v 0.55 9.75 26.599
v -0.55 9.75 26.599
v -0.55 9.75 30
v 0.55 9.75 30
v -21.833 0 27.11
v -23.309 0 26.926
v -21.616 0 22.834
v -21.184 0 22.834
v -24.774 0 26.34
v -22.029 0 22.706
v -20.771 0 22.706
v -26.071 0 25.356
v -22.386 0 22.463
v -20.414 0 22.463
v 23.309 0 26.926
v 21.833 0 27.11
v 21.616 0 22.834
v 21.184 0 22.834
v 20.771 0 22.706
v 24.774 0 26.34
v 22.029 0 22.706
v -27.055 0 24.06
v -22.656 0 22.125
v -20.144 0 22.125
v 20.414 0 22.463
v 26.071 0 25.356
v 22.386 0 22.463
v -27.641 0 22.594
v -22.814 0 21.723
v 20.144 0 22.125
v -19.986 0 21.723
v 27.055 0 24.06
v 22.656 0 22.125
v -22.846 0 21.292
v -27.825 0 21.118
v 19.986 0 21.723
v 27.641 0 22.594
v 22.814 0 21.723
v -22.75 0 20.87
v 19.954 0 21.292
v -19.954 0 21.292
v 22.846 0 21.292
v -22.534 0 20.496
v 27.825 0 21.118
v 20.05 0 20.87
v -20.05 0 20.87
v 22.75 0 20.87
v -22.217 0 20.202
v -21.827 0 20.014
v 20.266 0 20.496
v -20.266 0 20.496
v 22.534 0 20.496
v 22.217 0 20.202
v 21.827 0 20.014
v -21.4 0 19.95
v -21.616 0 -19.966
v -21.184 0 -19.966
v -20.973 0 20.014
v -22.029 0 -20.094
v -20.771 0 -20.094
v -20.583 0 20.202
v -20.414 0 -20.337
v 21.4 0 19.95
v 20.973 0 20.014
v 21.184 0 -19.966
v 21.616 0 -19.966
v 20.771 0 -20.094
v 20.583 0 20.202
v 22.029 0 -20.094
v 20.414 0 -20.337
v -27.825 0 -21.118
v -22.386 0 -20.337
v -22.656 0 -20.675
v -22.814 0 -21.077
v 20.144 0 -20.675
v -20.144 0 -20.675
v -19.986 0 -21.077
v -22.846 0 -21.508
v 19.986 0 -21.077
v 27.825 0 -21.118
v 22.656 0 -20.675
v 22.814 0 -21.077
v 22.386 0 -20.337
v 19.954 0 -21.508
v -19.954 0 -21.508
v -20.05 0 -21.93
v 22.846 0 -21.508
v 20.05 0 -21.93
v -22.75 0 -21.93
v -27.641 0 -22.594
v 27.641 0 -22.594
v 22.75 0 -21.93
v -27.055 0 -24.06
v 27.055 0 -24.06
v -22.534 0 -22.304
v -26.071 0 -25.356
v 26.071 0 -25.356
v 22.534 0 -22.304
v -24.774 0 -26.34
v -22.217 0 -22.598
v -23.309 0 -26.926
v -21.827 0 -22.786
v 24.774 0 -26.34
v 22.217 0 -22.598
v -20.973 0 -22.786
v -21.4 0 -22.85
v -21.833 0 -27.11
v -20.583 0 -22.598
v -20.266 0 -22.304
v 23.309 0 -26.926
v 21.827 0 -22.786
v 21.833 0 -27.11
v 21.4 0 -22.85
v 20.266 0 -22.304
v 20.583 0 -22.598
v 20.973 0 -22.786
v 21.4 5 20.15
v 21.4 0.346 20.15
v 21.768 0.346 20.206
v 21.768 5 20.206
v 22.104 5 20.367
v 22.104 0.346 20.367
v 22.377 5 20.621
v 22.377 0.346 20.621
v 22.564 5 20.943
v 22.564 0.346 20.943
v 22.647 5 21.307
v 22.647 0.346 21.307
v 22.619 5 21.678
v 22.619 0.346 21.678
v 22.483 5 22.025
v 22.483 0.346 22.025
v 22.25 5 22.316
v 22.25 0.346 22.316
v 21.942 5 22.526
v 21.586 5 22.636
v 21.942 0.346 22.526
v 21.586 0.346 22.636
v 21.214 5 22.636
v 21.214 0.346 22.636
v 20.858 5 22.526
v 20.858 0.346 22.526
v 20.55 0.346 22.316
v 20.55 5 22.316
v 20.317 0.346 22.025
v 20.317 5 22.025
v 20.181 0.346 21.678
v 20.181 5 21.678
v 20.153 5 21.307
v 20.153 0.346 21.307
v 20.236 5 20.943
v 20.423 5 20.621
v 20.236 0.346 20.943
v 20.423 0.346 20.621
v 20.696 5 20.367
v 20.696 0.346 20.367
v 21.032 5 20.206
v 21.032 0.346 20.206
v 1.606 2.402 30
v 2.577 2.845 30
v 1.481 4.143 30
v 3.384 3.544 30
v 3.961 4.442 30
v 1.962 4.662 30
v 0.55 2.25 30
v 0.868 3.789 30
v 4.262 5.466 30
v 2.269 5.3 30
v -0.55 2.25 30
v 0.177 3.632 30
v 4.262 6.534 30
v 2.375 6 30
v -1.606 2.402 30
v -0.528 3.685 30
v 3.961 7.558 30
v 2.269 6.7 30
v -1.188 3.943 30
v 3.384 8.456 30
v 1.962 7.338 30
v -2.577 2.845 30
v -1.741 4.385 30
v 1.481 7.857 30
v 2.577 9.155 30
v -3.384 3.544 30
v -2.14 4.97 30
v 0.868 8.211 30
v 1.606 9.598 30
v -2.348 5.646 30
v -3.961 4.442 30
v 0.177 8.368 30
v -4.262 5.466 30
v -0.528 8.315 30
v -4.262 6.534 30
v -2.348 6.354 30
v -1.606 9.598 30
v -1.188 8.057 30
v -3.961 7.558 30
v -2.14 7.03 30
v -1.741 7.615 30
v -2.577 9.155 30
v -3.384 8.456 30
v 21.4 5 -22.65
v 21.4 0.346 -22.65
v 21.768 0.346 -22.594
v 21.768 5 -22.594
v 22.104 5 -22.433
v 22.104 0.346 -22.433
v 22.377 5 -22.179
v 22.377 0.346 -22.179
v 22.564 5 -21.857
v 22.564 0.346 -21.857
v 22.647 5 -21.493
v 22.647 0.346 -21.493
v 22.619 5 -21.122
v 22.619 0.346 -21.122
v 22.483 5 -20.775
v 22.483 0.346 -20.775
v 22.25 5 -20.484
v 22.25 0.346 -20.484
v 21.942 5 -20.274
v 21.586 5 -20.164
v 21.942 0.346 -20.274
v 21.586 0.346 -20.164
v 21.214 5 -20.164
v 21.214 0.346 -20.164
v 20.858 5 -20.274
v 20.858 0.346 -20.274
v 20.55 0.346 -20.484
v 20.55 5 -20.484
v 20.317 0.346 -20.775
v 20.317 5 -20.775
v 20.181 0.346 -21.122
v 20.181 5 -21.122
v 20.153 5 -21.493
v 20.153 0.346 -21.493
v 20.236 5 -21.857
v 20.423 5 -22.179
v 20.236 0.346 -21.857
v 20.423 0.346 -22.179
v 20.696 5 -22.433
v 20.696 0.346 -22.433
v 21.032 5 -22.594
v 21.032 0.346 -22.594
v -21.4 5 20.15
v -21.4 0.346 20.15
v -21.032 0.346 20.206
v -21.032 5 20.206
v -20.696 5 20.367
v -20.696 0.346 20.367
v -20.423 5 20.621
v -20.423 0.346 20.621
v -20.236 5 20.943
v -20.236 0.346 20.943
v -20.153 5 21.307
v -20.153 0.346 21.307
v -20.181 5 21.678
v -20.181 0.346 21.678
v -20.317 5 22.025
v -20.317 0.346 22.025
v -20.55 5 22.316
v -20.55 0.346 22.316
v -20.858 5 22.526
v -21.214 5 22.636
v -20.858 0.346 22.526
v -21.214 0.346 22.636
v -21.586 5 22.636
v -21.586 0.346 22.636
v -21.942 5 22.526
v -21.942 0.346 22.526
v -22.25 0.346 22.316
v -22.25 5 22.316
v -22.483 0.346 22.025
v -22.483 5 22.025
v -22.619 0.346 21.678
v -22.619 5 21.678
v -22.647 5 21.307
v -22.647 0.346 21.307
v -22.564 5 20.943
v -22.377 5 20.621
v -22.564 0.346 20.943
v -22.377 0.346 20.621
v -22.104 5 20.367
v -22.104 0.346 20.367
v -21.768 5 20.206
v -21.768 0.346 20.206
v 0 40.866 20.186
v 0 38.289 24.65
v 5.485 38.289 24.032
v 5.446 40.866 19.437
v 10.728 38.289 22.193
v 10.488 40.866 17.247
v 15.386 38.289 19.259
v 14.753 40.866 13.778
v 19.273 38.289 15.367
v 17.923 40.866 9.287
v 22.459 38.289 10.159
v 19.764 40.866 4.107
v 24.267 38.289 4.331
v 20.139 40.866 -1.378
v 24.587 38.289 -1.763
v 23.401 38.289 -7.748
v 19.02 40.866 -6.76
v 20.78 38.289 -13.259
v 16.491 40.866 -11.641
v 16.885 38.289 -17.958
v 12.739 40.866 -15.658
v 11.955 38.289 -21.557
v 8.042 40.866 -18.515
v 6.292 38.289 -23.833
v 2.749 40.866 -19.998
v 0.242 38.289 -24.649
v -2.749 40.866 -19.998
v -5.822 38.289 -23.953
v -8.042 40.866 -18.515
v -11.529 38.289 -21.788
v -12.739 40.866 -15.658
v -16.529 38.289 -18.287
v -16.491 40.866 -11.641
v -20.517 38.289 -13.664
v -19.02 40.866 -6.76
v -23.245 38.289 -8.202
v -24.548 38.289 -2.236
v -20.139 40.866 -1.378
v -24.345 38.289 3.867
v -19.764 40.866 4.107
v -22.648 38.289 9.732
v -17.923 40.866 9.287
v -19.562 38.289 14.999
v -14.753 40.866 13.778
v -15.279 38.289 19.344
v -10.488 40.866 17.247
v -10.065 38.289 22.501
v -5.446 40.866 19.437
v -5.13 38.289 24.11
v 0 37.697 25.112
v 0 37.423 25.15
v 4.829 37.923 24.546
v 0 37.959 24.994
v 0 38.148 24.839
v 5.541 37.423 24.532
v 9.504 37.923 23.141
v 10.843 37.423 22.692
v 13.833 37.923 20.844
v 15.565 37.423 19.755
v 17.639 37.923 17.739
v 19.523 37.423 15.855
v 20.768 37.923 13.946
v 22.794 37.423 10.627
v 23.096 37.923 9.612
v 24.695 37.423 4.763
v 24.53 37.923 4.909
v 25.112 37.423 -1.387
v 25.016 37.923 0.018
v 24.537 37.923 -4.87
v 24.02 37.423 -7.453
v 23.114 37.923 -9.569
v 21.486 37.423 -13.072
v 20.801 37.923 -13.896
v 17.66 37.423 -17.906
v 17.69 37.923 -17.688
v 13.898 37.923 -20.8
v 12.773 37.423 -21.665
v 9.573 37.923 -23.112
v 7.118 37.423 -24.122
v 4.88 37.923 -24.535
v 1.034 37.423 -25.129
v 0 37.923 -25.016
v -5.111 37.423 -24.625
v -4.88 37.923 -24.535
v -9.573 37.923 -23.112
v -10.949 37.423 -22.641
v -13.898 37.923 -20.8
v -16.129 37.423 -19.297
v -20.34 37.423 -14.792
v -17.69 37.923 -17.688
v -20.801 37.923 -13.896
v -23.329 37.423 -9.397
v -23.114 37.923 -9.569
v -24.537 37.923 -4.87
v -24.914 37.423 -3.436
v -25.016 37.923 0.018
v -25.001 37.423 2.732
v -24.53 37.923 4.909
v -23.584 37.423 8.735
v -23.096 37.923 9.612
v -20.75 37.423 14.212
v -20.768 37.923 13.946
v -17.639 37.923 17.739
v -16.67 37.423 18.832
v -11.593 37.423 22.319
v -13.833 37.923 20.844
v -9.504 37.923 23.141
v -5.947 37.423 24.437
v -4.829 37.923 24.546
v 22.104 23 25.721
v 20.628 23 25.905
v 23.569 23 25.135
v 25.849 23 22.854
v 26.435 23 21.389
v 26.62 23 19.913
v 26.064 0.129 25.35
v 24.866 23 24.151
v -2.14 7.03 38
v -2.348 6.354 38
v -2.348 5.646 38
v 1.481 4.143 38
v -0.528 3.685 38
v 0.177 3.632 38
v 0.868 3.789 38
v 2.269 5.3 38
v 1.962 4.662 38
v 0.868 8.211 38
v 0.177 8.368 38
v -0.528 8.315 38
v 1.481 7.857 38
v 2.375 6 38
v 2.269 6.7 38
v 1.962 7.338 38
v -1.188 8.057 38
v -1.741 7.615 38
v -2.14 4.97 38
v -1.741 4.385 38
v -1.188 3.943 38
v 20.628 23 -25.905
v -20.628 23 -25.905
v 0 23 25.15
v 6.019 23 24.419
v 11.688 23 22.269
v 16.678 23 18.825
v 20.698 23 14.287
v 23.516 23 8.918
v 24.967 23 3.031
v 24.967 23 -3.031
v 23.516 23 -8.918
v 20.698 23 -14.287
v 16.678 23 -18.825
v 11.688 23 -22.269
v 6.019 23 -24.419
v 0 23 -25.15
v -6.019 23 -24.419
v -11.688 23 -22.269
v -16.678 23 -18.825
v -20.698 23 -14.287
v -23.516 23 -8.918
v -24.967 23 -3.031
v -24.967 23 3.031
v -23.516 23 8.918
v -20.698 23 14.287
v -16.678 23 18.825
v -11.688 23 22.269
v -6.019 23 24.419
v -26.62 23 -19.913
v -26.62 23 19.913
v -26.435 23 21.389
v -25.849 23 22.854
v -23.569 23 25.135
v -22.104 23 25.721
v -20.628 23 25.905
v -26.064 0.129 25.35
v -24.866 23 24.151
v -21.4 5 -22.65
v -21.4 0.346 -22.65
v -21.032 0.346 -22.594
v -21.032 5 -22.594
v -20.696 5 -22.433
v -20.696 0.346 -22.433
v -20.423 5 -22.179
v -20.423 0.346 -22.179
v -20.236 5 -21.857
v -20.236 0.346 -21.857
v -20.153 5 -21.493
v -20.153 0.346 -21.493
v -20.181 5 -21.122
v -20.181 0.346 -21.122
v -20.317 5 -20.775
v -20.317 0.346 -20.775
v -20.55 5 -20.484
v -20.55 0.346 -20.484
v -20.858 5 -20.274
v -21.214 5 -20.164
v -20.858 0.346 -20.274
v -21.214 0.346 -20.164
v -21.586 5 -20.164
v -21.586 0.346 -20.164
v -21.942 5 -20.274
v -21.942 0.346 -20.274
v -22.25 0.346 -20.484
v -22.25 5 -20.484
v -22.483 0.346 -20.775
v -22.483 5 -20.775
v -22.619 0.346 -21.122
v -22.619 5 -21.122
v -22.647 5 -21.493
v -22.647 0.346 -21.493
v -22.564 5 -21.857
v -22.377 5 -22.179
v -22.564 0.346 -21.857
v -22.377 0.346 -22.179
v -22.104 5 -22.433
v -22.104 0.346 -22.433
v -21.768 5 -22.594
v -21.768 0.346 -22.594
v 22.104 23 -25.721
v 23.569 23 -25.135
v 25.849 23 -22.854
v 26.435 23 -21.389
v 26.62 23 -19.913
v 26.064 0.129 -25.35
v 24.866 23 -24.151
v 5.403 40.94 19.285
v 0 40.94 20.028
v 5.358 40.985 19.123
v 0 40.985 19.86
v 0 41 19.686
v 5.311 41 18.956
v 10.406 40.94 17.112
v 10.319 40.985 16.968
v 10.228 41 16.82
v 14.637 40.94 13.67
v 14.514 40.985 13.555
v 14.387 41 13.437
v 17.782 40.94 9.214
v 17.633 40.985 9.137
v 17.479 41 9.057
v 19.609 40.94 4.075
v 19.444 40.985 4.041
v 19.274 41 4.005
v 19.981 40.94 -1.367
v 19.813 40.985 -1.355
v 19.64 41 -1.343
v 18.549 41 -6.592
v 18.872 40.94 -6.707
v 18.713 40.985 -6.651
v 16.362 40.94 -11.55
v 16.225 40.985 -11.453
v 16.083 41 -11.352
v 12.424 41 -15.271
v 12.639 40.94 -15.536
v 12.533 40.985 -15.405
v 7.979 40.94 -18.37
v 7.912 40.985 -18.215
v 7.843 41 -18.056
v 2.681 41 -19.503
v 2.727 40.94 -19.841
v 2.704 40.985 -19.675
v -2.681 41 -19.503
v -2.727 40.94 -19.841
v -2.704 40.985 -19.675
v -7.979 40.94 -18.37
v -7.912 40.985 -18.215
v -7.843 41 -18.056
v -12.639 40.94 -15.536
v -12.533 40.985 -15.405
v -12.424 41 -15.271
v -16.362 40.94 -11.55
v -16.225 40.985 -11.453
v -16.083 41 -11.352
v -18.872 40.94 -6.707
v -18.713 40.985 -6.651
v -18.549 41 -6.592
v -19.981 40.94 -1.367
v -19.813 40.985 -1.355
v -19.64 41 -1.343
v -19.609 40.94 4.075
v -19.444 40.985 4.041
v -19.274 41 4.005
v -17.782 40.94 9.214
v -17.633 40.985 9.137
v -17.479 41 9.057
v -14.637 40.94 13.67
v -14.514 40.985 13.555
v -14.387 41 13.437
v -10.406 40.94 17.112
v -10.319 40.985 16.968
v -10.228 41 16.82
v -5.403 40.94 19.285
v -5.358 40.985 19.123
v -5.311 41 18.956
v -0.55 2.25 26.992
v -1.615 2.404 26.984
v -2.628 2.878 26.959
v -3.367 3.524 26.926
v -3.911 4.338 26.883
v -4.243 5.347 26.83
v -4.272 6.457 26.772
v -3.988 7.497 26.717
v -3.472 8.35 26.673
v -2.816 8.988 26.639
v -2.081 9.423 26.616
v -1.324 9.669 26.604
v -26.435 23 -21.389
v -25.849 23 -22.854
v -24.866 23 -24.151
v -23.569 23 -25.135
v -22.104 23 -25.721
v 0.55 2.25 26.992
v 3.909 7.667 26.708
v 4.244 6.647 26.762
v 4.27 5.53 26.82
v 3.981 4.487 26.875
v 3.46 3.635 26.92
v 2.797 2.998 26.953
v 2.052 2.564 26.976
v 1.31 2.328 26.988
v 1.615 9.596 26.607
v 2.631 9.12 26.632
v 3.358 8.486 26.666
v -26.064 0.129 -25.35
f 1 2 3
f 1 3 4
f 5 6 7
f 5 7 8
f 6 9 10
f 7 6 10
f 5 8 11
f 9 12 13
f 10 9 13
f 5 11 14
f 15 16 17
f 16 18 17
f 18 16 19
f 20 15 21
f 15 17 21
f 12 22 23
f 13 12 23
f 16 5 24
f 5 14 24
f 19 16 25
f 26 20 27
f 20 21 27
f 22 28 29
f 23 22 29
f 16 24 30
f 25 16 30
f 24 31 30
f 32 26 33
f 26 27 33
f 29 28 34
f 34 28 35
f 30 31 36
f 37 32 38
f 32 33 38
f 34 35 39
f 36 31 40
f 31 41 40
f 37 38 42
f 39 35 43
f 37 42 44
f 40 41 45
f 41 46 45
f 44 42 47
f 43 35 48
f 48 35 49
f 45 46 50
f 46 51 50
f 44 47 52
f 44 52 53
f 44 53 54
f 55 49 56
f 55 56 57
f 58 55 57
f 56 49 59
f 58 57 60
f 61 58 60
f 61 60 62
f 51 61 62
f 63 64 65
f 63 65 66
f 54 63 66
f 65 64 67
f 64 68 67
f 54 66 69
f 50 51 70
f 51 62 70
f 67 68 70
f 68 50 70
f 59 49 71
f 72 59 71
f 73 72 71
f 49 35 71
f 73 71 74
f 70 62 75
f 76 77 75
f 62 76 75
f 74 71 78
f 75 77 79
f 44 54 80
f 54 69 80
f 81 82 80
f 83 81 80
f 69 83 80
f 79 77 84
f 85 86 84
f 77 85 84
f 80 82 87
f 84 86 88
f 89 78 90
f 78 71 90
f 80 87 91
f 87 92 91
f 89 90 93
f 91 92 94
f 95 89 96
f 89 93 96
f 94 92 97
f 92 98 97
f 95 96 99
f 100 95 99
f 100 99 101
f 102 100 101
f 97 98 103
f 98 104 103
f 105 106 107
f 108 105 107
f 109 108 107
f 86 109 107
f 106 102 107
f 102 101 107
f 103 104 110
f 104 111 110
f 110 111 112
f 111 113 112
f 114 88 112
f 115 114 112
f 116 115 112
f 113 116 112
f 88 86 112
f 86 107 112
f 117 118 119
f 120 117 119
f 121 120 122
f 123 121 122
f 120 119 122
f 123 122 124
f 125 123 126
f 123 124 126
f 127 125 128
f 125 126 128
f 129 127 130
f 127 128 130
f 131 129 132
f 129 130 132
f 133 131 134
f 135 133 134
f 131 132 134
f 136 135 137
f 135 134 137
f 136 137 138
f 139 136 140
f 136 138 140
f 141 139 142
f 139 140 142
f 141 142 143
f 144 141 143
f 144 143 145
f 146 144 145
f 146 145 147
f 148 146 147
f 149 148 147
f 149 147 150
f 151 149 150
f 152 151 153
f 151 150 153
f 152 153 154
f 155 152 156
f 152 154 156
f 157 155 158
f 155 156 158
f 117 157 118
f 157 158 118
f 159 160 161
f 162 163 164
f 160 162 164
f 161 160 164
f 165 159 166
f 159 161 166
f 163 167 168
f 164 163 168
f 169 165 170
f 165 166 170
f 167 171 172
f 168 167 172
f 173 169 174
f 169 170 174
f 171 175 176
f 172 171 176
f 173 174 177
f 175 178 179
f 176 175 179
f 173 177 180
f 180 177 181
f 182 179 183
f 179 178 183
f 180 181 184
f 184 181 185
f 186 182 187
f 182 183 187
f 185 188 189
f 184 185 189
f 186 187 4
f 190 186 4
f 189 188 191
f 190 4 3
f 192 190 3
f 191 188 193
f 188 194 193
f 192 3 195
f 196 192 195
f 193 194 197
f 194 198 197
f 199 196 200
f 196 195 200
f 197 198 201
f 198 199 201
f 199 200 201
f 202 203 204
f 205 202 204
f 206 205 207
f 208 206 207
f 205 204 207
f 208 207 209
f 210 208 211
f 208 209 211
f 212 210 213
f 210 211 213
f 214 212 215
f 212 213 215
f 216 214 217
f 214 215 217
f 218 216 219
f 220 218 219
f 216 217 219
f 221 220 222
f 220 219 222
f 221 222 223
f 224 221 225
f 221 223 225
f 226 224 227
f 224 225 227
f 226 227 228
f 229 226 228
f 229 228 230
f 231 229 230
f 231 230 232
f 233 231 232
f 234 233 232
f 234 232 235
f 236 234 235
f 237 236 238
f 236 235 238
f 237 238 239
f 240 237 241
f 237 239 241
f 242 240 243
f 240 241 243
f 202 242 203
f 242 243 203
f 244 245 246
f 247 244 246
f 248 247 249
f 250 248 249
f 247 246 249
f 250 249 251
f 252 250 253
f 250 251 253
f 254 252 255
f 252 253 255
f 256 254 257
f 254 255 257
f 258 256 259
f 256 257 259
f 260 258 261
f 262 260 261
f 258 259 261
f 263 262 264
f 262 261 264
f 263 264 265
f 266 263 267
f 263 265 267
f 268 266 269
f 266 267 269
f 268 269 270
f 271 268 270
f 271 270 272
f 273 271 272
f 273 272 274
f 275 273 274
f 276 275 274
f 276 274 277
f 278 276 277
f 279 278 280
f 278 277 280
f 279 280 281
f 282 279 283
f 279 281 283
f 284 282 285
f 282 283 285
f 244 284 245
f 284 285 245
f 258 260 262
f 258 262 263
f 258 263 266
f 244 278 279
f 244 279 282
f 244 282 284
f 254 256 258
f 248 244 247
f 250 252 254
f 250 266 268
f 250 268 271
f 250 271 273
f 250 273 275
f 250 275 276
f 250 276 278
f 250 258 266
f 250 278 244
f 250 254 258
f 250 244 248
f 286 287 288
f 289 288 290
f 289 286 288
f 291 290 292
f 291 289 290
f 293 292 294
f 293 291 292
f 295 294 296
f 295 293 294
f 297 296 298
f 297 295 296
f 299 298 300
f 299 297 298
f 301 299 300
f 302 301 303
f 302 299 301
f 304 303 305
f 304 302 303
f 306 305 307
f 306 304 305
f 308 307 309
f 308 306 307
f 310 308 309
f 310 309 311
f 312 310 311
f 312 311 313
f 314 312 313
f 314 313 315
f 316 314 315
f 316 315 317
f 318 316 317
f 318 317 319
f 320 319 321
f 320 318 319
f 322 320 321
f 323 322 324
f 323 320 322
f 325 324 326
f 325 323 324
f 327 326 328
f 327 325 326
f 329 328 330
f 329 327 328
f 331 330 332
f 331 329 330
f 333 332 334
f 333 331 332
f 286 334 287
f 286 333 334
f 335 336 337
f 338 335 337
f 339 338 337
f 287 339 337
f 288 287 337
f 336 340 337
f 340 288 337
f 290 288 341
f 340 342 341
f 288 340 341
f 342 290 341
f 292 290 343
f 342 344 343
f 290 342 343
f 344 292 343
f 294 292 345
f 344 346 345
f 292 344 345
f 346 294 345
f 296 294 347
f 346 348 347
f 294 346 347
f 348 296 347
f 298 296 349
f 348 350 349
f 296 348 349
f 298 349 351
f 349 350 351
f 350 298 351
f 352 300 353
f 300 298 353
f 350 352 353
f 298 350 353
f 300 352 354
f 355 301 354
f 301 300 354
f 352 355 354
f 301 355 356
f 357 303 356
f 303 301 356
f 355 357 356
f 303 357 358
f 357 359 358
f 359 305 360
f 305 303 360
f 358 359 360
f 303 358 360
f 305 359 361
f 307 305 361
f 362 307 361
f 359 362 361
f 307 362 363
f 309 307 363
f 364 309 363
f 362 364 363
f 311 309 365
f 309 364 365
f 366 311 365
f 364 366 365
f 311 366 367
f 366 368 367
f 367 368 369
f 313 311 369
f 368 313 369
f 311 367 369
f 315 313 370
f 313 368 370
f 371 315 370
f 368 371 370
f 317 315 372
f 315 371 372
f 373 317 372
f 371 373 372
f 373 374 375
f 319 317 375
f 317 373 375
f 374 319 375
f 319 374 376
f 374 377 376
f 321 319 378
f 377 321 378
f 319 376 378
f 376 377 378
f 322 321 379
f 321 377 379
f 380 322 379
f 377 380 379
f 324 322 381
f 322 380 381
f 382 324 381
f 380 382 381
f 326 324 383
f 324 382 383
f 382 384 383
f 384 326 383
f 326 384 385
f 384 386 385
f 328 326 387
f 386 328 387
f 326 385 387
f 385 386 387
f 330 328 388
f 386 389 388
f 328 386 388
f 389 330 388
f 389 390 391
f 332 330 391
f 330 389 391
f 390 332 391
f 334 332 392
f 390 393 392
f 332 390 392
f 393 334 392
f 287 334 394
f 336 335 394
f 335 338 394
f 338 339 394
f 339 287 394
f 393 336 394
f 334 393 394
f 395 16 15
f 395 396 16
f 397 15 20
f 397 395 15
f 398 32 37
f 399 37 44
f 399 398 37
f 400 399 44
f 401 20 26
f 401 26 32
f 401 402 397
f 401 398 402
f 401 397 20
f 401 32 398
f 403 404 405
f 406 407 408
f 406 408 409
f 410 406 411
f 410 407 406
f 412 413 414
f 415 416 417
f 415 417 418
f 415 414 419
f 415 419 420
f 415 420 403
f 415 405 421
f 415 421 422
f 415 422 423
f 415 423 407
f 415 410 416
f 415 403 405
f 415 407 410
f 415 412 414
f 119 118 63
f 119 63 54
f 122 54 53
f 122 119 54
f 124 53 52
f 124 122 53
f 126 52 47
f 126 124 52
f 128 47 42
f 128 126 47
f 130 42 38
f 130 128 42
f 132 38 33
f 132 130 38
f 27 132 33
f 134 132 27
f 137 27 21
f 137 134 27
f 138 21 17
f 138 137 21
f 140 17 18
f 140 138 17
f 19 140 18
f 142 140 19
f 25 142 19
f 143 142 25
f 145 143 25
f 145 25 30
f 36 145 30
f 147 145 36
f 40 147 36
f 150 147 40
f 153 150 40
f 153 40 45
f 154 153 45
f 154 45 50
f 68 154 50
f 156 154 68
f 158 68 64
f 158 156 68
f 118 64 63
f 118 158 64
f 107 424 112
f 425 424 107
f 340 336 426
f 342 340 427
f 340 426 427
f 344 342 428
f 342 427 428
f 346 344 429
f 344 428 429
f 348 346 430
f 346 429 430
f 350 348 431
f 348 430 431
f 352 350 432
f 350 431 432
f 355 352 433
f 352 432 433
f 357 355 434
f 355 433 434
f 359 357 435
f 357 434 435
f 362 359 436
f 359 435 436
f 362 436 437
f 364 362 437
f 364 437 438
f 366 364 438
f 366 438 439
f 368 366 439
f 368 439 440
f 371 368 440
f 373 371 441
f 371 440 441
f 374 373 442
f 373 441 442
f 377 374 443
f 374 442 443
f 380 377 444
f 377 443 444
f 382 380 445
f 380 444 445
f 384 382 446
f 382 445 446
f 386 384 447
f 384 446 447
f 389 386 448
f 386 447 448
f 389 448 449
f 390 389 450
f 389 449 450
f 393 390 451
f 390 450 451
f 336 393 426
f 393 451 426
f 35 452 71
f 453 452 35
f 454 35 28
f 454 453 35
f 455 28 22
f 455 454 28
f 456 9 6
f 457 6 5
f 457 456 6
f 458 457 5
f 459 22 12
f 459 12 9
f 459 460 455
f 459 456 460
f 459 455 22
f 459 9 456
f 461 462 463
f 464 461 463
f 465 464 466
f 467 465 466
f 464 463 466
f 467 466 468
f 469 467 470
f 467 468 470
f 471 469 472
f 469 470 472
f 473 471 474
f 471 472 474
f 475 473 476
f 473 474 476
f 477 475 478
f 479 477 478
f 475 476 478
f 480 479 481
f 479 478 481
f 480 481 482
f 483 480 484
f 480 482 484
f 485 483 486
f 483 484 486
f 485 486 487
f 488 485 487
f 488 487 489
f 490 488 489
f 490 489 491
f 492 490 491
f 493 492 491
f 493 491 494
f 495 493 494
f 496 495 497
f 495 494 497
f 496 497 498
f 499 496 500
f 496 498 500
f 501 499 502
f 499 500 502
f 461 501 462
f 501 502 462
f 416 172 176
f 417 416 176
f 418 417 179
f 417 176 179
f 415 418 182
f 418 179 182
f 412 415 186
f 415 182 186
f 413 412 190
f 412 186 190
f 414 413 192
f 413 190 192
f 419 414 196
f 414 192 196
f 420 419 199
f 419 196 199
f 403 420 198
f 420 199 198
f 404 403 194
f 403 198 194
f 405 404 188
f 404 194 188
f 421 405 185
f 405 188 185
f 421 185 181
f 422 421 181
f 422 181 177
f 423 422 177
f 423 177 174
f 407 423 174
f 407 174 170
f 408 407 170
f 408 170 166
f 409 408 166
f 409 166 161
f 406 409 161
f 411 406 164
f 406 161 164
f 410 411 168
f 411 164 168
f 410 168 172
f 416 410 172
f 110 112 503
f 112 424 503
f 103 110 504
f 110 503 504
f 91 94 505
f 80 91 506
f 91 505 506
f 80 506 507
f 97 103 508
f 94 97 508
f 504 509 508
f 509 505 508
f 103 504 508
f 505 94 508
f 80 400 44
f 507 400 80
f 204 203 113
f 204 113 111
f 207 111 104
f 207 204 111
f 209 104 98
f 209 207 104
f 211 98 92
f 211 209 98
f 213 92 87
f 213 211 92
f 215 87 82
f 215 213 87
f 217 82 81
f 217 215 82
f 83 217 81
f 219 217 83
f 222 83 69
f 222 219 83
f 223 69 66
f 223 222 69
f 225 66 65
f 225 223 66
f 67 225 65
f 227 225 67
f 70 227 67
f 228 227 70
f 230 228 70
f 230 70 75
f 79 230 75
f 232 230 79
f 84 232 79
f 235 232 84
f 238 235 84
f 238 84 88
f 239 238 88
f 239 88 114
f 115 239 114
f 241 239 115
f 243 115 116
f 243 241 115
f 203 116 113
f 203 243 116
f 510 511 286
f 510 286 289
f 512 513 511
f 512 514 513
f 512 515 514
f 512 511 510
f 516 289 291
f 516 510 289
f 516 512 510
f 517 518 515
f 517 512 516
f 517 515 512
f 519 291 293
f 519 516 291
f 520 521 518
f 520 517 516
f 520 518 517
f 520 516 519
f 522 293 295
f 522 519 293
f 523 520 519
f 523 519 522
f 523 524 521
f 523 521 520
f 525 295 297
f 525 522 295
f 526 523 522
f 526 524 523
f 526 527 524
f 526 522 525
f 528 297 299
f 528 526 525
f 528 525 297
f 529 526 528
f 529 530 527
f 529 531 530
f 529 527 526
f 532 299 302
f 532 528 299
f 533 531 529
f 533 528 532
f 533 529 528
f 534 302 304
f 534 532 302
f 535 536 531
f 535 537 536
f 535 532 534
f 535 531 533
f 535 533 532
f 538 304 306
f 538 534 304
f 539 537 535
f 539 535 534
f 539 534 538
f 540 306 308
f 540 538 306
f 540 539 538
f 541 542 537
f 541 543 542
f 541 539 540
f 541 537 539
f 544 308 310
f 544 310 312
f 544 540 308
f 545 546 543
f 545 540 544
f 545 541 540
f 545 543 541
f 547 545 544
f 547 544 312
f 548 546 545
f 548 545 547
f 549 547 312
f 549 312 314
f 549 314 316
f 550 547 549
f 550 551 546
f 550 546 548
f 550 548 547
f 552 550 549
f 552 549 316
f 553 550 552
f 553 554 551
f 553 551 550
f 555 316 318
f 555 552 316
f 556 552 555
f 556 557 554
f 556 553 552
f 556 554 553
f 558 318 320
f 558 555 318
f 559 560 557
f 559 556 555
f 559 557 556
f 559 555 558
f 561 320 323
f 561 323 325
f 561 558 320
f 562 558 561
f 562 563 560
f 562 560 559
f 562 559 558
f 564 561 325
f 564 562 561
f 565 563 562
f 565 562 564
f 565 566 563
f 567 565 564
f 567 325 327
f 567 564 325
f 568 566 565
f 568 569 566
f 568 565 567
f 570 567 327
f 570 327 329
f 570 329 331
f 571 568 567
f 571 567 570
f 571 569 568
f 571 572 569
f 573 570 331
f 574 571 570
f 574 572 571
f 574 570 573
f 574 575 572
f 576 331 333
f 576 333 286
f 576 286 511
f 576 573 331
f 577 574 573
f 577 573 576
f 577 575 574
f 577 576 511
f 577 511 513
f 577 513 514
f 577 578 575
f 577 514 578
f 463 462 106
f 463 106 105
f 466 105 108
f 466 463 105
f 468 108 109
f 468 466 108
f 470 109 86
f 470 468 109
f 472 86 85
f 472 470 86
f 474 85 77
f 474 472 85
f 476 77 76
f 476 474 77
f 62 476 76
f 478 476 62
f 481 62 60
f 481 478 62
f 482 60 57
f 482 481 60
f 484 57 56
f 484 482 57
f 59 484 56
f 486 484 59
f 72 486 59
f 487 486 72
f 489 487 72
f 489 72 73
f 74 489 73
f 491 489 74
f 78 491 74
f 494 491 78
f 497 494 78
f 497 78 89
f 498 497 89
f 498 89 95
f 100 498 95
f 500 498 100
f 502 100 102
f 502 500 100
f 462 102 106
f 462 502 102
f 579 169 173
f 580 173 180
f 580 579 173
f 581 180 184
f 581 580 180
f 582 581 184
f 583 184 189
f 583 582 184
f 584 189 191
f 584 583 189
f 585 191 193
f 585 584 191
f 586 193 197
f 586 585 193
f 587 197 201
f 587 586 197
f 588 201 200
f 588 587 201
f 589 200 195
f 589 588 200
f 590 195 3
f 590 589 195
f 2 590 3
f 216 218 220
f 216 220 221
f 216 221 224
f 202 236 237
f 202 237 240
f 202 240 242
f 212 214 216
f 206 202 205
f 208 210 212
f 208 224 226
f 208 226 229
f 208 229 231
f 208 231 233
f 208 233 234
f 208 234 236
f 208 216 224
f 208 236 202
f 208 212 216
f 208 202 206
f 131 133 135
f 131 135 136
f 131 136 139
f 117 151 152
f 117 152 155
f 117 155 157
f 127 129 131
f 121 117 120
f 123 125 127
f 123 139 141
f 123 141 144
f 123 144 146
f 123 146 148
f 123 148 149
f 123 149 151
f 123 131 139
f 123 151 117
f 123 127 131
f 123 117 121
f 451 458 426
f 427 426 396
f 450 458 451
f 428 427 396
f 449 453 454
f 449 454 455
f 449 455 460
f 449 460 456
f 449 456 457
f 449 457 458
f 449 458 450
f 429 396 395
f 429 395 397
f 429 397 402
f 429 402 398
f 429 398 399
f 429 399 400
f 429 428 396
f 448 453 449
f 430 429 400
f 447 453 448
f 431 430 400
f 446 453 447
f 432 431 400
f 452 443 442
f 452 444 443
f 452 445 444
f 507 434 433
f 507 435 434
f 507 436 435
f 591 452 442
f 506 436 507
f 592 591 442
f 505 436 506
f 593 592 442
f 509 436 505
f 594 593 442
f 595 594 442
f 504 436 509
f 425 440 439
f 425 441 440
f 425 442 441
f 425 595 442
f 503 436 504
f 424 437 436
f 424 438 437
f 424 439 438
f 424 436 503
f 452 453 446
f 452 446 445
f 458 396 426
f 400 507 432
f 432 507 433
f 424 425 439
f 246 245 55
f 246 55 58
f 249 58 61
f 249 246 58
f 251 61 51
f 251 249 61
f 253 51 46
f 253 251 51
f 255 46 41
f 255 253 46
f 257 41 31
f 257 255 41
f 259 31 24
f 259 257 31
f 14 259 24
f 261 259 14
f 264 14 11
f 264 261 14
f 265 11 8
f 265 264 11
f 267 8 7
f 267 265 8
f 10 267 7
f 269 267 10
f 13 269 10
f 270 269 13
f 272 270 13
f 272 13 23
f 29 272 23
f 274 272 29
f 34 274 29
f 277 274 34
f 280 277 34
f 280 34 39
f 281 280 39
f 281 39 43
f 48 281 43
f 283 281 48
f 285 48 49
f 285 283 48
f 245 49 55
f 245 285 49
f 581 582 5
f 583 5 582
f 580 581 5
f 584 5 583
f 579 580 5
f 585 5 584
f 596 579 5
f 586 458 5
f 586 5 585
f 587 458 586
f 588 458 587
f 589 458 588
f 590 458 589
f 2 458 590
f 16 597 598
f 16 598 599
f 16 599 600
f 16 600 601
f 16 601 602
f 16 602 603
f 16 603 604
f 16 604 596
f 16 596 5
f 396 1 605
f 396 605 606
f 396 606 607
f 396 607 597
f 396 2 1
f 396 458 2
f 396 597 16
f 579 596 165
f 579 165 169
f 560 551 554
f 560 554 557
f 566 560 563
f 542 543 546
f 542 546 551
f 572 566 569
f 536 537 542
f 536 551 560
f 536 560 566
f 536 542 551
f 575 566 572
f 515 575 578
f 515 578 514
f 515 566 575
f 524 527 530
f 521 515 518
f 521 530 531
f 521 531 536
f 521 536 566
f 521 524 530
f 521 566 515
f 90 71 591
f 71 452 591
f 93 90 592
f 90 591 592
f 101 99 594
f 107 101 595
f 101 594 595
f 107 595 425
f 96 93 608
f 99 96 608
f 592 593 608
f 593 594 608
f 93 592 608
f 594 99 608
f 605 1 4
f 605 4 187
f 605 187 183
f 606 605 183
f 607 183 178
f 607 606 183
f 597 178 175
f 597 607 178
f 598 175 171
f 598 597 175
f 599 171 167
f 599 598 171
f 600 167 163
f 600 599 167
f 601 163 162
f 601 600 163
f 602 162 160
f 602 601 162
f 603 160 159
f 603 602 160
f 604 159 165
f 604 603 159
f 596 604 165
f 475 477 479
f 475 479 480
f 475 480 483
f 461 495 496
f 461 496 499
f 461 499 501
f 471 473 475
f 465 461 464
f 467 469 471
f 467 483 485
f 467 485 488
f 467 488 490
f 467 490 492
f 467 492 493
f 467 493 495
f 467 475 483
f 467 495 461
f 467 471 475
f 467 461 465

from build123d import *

# Parameters (mm, degrees)
SKETCH1_W           = 55.65
SKETCH1_H           = 54.22051571
BOSS_EXTRUDE1_DEPTH = 23
BOSS_EXTRUDE1_TAPER = 3
SKETCH2_R           = 25.15
BOSS_EXTRUDE2_DEPTH = 18
CHAMFER1_SIZE       = 3
CHAMFER1_SIZE2      = 5.196152423
BOSS_EXTRUDE3_DEPTH = 30
SKETCH4_R           = 2.375
BOSS_EXTRUDE4_DEPTH = 8
SKETCH5_R           = 1.25
CUT_EXTRUDE1_DEPTH  = 5
CHAMFER2_SIZE       = 0.2
CHAMFER2_SIZE2      = 0.346410162
FILLET1_R           = 6
FILLET2_R           = 1


with BuildPart() as part:
    # Sketch1 → Boss-Extrude1 (new body)
    with BuildSketch(Plane(origin=(0, 0, 0), x_dir=(1, 0, 0), z_dir=(0, 1, 0))):
        Rectangle(SKETCH1_W, SKETCH1_H)
    extrude(amount=BOSS_EXTRUDE1_DEPTH, taper=BOSS_EXTRUDE1_TAPER)

    # Sketch2 → Boss-Extrude2 (add)
    with BuildSketch(Plane(origin=(0, 23, 0), x_dir=(1, 0, 0), z_dir=(0, 1, 0))):
        with Locations(Location((0, 0, 0), (0, 0, 270))):
            Circle(SKETCH2_R)
    extrude(amount=BOSS_EXTRUDE2_DEPTH)

    # Chamfer1
    chamfer1_edges = [part.edges().sort_by_distance(p)[0] for p in [
        (0, 41, -25.15),
    ]]
    chamfer1_side = [part.faces().sort_by_distance(p)[0] for p in [
        (0, 32, -25.15),
    ]]
    chamfer(chamfer1_edges, length=CHAMFER1_SIZE, length2=CHAMFER1_SIZE2, reference=chamfer1_side[0])

    # Sketch3 → Boss-Extrude3 (add)
    with BuildSketch(Plane.XY):
        with BuildLine():
            Line((0.55, 2.25), (-0.55, 2.25))
            ThreePointArc((-0.55, 2.25), (-4.3, 6), (-0.55, 9.75))
            Line((-0.55, 9.75), (0.55, 9.75))
            ThreePointArc((0.55, 9.75), (4.3, 6), (0.55, 2.25))
        make_face()
    extrude(amount=BOSS_EXTRUDE3_DEPTH)

    # Sketch4 → Boss-Extrude4 (add)
    with BuildSketch(Plane.XY.offset(30)):
        with Locations((0, 6)):
            Circle(SKETCH4_R)
    extrude(amount=BOSS_EXTRUDE4_DEPTH)

    # Sketch5 → Cut-Extrude1 (cut)
    with BuildSketch(Plane.XZ):
        with Locations(Location((-21.4, 21.4, 0), (0, 0, 270))):
            Circle(SKETCH5_R)
        with Locations(Location((21.4, 21.4, 0), (0, 0, 270))):
            Circle(SKETCH5_R)
        with Locations(Location((21.4, -21.4, 0), (0, 0, 270))):
            Circle(SKETCH5_R)
        with Locations(Location((-21.4, -21.4, 0), (0, 0, 270))):
            Circle(SKETCH5_R)
    extrude(amount=-CUT_EXTRUDE1_DEPTH, mode=Mode.SUBTRACT)

    # Chamfer2
    chamfer2_edges = [part.edges().sort_by_distance(p)[0] for p in [
        (-21.4, 0, -20.15),
        (21.4, 0, -20.15),
        (21.4, 0, 22.65),
        (-21.4, 0, 22.65),
    ]]
    chamfer2_side = [part.faces().sort_by_distance(p)[0] for p in [
        (0, 0, 0),
    ]]
    chamfer(chamfer2_edges, length=CHAMFER2_SIZE, length2=CHAMFER2_SIZE2, reference=chamfer2_side[0])

    # Fillet1
    fillet1_edges = [part.edges().sort_by_distance(p)[0] for p in [
        (-27.222310538, 11.5, -26.507568393),
        (27.222310538, 11.5, -26.507568393),
        (27.222310538, 11.5, 26.507568393),
        (-27.222310538, 11.5, 26.507568393),
    ]]
    fillet(fillet1_edges, radius=FILLET1_R)

    # Fillet2
    fillet2_edges = [part.edges().sort_by_distance(p)[0] for p in [
        (0, 41, -19.953847577),
        (0, 38, -25.15),
    ]]
    fillet(fillet2_edges, radius=FILLET2_R)


solid = part.part
